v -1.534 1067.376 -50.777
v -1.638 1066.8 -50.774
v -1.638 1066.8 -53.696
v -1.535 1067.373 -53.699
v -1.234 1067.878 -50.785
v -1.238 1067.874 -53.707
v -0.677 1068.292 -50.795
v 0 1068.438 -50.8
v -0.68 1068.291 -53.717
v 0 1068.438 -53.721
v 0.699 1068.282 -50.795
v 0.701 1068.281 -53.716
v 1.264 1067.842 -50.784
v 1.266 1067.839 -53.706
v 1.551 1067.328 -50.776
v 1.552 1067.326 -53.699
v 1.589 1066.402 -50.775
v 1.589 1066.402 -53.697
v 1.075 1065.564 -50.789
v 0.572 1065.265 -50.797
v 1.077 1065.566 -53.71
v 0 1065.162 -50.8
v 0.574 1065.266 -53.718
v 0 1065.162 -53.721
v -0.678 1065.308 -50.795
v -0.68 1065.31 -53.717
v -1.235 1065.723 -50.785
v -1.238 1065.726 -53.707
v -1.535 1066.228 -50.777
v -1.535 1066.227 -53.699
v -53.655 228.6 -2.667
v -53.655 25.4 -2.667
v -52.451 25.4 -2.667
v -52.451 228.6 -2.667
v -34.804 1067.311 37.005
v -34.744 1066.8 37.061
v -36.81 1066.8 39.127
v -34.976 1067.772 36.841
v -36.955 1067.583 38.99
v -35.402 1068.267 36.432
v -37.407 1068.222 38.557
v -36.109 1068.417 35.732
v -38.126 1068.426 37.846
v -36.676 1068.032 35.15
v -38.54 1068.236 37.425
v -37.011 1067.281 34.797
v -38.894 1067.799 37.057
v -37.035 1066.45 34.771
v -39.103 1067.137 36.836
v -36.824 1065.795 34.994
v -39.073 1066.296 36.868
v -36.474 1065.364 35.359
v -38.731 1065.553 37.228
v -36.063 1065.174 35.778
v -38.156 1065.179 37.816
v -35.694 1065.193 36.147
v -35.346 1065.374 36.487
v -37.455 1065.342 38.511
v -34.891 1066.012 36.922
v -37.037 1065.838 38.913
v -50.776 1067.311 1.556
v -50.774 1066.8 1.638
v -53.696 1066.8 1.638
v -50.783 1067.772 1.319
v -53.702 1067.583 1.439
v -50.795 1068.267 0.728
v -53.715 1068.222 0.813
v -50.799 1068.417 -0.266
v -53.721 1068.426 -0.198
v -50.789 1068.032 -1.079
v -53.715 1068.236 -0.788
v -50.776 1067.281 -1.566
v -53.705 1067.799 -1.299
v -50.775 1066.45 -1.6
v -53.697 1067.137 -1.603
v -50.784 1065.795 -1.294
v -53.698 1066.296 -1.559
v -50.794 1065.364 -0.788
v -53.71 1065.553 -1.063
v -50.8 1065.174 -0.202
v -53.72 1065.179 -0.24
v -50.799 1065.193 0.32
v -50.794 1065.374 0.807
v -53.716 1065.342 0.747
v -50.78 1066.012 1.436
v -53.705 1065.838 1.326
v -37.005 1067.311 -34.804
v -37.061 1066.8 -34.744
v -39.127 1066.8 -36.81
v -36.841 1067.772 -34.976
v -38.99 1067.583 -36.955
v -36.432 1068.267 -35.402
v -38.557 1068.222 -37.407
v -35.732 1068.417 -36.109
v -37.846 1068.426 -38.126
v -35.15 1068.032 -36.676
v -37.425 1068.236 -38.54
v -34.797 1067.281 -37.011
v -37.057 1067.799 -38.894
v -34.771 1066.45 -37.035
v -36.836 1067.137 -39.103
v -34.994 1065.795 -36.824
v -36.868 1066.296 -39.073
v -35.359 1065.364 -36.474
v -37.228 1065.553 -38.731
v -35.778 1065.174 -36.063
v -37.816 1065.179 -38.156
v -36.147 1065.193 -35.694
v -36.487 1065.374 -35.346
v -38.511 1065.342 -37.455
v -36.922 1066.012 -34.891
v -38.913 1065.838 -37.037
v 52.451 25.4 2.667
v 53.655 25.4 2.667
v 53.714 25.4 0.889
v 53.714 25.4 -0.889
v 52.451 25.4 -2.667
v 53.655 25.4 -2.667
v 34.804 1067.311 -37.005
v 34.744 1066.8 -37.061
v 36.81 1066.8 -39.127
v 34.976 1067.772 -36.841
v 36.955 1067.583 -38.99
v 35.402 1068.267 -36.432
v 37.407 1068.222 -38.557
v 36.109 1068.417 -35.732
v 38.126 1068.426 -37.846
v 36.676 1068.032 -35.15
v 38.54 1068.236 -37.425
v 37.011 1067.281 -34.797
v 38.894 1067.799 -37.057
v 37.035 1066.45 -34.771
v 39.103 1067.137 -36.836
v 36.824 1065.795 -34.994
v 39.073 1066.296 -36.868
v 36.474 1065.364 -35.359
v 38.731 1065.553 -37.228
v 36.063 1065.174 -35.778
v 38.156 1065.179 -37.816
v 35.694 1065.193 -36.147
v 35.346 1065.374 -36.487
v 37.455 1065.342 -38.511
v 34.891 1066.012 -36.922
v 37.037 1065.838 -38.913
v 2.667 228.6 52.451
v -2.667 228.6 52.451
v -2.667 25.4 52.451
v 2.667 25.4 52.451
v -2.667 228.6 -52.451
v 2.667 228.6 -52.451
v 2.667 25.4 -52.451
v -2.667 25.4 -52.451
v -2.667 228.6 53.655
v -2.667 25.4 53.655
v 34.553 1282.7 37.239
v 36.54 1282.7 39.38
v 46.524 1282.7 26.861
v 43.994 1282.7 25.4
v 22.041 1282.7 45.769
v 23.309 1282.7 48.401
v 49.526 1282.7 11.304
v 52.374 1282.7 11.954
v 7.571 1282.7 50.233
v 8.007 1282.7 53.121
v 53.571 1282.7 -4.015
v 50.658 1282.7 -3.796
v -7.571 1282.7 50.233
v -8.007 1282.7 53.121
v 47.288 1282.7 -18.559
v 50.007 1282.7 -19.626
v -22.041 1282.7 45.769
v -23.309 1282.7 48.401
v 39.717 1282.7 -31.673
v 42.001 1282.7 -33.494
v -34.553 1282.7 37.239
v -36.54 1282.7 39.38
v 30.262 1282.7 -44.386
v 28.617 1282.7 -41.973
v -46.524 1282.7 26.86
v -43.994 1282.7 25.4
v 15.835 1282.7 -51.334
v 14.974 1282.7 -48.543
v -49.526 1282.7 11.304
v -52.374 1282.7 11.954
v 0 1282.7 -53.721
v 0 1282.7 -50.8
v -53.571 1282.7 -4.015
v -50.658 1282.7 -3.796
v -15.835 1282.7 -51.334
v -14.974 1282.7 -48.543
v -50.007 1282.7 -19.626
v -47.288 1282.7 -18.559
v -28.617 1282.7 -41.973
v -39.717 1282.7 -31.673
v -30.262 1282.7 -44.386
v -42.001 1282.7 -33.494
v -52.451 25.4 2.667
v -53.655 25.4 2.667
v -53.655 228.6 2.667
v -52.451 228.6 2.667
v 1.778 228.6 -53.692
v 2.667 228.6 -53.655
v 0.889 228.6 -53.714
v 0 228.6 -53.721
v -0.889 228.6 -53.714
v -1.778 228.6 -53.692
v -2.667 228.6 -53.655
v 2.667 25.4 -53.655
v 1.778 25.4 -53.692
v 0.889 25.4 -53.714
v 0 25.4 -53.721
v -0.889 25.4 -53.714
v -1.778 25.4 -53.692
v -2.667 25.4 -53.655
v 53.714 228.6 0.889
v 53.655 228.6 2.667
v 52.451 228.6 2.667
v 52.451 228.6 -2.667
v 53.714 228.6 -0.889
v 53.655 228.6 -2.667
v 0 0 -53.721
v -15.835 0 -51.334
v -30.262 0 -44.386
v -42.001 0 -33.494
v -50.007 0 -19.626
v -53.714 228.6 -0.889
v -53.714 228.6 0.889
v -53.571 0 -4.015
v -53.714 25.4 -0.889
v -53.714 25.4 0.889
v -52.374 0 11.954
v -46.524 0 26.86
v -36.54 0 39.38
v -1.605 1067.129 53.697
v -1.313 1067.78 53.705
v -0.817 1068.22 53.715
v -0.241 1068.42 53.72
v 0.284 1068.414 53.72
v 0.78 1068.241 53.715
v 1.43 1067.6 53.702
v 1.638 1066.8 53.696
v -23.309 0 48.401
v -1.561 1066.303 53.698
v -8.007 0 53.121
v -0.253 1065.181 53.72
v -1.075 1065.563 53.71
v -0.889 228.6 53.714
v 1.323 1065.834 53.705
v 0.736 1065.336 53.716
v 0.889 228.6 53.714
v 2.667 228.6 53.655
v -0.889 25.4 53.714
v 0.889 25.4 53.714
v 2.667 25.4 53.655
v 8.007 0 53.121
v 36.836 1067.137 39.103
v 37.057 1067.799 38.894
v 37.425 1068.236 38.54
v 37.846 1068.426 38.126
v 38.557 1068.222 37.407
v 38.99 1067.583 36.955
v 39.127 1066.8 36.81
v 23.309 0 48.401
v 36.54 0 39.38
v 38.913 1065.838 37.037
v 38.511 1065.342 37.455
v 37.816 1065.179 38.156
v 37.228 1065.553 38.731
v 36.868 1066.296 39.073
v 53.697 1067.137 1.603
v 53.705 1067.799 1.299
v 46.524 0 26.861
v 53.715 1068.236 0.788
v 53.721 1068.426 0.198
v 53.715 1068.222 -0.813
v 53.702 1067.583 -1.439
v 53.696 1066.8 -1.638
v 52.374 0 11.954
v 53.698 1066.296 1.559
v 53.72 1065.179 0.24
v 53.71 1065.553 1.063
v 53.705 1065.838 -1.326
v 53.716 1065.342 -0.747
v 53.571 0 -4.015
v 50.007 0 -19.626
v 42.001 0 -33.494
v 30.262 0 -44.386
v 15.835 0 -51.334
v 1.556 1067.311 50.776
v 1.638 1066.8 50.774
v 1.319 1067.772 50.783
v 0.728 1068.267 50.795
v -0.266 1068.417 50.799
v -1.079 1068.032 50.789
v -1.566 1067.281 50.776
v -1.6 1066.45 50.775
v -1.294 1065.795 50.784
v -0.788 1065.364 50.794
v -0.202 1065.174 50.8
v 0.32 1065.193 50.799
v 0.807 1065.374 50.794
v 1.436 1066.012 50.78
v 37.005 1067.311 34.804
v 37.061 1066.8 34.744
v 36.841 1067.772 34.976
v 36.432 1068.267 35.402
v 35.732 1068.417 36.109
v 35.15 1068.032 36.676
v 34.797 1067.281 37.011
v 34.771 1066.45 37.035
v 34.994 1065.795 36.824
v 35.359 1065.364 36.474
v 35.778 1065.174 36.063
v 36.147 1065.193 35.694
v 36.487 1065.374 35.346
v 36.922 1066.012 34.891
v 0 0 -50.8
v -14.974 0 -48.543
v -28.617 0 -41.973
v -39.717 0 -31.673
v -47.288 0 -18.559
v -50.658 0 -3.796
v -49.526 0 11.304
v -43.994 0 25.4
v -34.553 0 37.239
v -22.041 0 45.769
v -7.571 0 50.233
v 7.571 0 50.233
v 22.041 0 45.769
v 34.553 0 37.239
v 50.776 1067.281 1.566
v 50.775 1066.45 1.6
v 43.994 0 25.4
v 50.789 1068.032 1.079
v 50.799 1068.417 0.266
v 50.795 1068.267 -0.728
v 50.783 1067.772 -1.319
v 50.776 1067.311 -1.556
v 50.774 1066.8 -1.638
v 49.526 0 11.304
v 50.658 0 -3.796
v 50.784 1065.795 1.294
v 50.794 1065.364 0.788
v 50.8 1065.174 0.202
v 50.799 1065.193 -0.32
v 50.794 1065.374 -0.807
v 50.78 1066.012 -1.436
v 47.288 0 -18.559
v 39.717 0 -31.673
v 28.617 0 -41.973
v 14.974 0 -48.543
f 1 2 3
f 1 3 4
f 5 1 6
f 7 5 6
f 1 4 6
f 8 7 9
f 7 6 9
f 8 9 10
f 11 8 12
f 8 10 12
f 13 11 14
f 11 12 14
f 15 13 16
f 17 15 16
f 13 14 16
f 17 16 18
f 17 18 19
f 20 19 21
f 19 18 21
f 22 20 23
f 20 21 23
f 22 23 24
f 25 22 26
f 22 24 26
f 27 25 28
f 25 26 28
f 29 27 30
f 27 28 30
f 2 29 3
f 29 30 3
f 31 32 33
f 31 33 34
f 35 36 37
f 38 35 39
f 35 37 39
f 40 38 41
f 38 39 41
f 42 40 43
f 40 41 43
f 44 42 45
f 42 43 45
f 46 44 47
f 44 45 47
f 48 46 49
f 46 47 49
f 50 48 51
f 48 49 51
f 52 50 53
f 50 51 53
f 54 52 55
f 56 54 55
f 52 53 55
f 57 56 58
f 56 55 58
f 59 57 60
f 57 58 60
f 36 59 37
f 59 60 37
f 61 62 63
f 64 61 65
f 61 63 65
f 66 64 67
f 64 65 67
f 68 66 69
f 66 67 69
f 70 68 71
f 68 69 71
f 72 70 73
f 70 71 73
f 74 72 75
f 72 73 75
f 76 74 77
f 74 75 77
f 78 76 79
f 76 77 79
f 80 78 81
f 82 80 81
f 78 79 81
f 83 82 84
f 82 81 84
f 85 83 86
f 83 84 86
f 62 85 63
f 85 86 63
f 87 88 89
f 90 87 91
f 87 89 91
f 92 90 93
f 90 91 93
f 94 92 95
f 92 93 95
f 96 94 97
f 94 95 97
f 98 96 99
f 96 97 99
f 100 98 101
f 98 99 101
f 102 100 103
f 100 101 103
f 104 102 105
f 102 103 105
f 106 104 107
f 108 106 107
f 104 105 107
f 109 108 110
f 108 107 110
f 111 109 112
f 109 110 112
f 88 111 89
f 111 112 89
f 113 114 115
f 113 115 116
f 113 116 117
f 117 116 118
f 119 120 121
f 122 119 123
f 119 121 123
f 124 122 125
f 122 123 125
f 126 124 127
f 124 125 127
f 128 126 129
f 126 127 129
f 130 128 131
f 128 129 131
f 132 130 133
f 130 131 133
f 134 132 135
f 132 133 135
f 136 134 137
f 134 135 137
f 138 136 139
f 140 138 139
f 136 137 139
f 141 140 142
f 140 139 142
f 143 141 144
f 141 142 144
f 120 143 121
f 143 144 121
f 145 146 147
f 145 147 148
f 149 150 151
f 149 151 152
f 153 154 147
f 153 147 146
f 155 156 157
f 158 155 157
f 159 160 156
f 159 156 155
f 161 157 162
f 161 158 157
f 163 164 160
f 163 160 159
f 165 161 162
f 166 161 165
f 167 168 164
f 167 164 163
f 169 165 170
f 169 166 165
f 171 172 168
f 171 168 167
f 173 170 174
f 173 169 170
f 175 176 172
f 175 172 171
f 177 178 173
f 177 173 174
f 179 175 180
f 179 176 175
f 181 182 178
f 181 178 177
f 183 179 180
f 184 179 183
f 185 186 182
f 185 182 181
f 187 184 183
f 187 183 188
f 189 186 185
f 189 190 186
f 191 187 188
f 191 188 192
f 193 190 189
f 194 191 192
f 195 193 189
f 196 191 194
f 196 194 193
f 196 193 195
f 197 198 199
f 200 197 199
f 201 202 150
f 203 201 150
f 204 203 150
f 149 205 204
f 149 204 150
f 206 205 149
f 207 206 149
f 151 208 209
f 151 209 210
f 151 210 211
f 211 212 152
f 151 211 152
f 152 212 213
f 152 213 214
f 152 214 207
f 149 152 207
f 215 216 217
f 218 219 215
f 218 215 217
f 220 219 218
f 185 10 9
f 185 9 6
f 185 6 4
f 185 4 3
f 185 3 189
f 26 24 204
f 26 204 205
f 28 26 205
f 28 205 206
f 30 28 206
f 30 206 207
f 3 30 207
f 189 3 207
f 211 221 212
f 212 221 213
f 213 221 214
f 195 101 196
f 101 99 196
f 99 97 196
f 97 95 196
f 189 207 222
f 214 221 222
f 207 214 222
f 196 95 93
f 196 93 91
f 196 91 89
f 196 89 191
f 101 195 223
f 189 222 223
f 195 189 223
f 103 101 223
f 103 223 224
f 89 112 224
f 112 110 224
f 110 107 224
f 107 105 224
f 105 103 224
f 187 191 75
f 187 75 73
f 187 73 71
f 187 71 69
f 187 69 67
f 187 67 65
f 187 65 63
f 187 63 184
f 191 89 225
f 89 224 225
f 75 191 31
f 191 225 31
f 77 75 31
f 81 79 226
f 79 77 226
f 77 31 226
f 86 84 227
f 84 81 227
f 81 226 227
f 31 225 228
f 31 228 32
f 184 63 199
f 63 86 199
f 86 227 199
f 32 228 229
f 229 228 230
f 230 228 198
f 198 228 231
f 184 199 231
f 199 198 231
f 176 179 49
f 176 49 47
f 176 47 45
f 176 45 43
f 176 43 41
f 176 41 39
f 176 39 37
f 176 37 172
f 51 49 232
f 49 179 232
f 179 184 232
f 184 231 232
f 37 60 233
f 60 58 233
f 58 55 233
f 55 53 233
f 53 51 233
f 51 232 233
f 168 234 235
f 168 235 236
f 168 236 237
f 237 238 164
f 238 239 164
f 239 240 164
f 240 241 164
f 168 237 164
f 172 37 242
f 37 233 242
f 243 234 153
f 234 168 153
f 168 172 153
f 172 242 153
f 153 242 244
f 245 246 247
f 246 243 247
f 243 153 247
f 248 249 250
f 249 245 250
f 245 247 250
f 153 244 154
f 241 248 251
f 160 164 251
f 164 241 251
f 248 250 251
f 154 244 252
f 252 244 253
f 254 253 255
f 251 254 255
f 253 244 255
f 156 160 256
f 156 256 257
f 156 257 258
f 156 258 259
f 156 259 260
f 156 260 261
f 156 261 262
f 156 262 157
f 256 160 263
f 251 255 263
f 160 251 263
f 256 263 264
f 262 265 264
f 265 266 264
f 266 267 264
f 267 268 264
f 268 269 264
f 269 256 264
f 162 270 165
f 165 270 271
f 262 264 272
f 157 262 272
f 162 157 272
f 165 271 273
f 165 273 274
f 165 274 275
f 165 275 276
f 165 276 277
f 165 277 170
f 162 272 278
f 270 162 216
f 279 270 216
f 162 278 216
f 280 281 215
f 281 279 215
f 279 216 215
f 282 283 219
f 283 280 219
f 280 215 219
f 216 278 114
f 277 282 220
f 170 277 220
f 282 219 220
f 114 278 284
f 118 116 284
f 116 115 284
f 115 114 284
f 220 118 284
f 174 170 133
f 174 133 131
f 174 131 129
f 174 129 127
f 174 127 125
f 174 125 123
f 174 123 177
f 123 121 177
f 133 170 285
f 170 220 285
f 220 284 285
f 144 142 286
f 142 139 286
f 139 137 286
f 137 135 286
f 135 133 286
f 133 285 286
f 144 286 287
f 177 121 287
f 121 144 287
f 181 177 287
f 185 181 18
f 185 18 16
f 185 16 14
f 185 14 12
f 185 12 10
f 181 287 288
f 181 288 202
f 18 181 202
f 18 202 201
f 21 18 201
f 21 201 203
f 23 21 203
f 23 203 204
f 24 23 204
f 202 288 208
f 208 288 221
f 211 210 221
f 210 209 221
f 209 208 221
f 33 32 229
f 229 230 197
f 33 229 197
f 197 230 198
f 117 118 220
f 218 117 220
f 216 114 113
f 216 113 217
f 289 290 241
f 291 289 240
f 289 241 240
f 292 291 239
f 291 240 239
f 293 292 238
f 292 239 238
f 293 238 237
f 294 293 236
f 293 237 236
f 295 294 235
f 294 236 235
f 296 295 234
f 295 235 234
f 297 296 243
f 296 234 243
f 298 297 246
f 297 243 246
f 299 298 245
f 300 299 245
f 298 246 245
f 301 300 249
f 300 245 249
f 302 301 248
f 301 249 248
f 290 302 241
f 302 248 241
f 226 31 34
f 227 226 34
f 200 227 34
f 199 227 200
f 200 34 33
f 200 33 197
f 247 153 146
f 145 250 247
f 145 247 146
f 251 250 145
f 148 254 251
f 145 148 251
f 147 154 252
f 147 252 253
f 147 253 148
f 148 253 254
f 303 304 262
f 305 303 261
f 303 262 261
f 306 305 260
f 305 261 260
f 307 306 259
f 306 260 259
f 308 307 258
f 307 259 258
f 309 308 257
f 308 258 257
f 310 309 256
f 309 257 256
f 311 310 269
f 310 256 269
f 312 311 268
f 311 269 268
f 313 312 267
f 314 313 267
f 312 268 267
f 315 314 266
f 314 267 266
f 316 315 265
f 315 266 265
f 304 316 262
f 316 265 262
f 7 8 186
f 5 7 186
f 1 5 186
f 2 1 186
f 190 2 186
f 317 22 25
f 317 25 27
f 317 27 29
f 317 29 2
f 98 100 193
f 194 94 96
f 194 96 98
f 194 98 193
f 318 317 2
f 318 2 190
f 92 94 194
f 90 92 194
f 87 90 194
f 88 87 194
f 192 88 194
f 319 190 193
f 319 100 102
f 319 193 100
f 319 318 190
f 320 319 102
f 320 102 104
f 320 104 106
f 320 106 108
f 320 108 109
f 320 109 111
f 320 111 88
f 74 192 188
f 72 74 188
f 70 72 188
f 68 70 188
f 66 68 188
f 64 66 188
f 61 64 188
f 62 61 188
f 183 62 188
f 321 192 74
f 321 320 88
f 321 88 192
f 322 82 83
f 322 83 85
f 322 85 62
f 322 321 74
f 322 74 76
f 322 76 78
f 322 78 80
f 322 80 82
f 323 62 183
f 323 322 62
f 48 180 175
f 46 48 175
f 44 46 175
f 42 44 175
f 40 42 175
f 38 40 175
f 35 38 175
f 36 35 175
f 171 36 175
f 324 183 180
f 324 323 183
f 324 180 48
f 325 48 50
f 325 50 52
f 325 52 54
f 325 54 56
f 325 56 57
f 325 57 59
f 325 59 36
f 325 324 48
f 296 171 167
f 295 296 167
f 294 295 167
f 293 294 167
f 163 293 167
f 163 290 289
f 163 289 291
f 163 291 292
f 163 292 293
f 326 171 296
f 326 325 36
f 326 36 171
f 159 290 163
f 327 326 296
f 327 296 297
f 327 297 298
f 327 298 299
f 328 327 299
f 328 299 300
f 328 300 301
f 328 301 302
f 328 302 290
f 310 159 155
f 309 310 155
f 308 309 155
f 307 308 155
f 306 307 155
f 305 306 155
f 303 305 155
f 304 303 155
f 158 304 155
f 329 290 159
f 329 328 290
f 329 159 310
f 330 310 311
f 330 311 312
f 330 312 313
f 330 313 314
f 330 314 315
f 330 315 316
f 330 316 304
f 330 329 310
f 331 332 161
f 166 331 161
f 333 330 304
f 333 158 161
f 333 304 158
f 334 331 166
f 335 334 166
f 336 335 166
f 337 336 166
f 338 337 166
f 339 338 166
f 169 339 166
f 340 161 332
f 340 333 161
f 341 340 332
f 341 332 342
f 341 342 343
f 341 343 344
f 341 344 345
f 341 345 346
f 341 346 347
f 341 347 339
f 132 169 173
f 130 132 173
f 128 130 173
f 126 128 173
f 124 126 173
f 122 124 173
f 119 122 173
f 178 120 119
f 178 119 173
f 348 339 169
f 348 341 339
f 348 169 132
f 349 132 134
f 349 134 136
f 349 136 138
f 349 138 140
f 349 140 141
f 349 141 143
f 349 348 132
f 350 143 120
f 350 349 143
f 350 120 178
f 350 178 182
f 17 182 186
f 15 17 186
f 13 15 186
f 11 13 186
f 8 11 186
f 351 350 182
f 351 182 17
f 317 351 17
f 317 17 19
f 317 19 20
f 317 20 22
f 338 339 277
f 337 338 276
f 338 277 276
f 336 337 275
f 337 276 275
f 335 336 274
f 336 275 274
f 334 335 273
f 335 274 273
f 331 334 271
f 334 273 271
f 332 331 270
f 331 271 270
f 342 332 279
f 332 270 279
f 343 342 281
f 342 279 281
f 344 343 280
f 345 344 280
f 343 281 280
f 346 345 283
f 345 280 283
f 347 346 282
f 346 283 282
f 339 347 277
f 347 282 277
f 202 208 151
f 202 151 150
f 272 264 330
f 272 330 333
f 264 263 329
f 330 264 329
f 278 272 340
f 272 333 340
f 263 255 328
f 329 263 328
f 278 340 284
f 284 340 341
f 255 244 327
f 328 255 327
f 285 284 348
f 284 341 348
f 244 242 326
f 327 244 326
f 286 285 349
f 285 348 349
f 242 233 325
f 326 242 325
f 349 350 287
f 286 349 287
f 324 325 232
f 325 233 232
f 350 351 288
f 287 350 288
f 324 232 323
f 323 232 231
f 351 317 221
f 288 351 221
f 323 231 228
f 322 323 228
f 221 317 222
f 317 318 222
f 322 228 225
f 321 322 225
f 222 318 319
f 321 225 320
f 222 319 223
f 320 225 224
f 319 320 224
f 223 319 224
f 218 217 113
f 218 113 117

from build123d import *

# Parameters (mm, degrees)
SKETCH1_R                    = 53.721
SKETCH1_R_2                  = 50.8
TUBE_EXTRUSION_DEPTH         = 1282.7
ENGINE_BLOCK_HOLE_REACH      = 1290.312
ENGINE_BLOCK_HOLE_END_RADIUS = 50.8
SKETCH2_R                    = 1.6383
CIRPATTERN1_COUNT            = 8
SKETCH3_W                    = 5.334
SKETCH3_H                    = 203.2
FIN_SLOTS_DEPTH              = 1.27
CIRPATTERN2_COUNT            = 4


with BuildPart() as part:
    # Sketch1 → Tube Extrusion (new body)
    with BuildSketch(Plane(origin=(0, 0, 0), x_dir=(1, 0, 0), z_dir=(0, 1, 0))):
        with Locations(Location((0, 0, 0), (0, 0, 90))):
            Circle(SKETCH1_R)
        with Locations(Location((0, 0, 0), (0, 0, 90))):
            Circle(SKETCH1_R_2, mode=Mode.SUBTRACT)
    extrude(amount=TUBE_EXTRUSION_DEPTH)

    # Engine Block Hole: up to this cylinder (the profile starts outside it)
    engine_block_hole_end = Plane(origin=(0, 1066.8, 0), z_dir=(0, -1, 0)) * Cylinder(ENGINE_BLOCK_HOLE_END_RADIUS, 2683.224, mode=Mode.PRIVATE)
    # Sketch2 → Engine Block Hole (cut, up to the surface)
    with BuildSketch(Plane.XY.offset(53.721), mode=Mode.PRIVATE) as engine_block_hole_sk1:
        with Locations((0, 1066.8)):
            Circle(SKETCH2_R)
    engine_block_hole_tool1 = extrude(engine_block_hole_sk1.sketch, amount=-ENGINE_BLOCK_HOLE_REACH, mode=Mode.PRIVATE) - engine_block_hole_end
    engine_block_hole = engine_block_hole_tool1.solids().sort_by_distance((0, 1066.8, 53.721))[0]
    add(engine_block_hole, mode=Mode.SUBTRACT)

    # CirPattern1: Engine Block Hole ×8 about axis
    cirpattern1_axis = Axis((0, 1282.7, 0), (0, -1, 0))
    for i in range(1, CIRPATTERN1_COUNT):
        add(engine_block_hole.rotate(cirpattern1_axis, i * 360 / CIRPATTERN1_COUNT), mode=Mode.SUBTRACT)

    # Sketch3 → Fin Slots (cut)
    with BuildSketch(Plane.XY.offset(53.721)):
        with Locations((0, 127)):
            Rectangle(SKETCH3_W, SKETCH3_H)
    fin_slots = extrude(amount=-FIN_SLOTS_DEPTH, mode=Mode.SUBTRACT)

    # CirPattern2: Fin Slots ×4 about axis
    cirpattern2_axis = Axis((0, 0, 0), (0, 1, 0))
    for i in range(1, CIRPATTERN2_COUNT):
        add(fin_slots.rotate(cirpattern2_axis, i * 360 / CIRPATTERN2_COUNT), mode=Mode.SUBTRACT)


solid = part.part
